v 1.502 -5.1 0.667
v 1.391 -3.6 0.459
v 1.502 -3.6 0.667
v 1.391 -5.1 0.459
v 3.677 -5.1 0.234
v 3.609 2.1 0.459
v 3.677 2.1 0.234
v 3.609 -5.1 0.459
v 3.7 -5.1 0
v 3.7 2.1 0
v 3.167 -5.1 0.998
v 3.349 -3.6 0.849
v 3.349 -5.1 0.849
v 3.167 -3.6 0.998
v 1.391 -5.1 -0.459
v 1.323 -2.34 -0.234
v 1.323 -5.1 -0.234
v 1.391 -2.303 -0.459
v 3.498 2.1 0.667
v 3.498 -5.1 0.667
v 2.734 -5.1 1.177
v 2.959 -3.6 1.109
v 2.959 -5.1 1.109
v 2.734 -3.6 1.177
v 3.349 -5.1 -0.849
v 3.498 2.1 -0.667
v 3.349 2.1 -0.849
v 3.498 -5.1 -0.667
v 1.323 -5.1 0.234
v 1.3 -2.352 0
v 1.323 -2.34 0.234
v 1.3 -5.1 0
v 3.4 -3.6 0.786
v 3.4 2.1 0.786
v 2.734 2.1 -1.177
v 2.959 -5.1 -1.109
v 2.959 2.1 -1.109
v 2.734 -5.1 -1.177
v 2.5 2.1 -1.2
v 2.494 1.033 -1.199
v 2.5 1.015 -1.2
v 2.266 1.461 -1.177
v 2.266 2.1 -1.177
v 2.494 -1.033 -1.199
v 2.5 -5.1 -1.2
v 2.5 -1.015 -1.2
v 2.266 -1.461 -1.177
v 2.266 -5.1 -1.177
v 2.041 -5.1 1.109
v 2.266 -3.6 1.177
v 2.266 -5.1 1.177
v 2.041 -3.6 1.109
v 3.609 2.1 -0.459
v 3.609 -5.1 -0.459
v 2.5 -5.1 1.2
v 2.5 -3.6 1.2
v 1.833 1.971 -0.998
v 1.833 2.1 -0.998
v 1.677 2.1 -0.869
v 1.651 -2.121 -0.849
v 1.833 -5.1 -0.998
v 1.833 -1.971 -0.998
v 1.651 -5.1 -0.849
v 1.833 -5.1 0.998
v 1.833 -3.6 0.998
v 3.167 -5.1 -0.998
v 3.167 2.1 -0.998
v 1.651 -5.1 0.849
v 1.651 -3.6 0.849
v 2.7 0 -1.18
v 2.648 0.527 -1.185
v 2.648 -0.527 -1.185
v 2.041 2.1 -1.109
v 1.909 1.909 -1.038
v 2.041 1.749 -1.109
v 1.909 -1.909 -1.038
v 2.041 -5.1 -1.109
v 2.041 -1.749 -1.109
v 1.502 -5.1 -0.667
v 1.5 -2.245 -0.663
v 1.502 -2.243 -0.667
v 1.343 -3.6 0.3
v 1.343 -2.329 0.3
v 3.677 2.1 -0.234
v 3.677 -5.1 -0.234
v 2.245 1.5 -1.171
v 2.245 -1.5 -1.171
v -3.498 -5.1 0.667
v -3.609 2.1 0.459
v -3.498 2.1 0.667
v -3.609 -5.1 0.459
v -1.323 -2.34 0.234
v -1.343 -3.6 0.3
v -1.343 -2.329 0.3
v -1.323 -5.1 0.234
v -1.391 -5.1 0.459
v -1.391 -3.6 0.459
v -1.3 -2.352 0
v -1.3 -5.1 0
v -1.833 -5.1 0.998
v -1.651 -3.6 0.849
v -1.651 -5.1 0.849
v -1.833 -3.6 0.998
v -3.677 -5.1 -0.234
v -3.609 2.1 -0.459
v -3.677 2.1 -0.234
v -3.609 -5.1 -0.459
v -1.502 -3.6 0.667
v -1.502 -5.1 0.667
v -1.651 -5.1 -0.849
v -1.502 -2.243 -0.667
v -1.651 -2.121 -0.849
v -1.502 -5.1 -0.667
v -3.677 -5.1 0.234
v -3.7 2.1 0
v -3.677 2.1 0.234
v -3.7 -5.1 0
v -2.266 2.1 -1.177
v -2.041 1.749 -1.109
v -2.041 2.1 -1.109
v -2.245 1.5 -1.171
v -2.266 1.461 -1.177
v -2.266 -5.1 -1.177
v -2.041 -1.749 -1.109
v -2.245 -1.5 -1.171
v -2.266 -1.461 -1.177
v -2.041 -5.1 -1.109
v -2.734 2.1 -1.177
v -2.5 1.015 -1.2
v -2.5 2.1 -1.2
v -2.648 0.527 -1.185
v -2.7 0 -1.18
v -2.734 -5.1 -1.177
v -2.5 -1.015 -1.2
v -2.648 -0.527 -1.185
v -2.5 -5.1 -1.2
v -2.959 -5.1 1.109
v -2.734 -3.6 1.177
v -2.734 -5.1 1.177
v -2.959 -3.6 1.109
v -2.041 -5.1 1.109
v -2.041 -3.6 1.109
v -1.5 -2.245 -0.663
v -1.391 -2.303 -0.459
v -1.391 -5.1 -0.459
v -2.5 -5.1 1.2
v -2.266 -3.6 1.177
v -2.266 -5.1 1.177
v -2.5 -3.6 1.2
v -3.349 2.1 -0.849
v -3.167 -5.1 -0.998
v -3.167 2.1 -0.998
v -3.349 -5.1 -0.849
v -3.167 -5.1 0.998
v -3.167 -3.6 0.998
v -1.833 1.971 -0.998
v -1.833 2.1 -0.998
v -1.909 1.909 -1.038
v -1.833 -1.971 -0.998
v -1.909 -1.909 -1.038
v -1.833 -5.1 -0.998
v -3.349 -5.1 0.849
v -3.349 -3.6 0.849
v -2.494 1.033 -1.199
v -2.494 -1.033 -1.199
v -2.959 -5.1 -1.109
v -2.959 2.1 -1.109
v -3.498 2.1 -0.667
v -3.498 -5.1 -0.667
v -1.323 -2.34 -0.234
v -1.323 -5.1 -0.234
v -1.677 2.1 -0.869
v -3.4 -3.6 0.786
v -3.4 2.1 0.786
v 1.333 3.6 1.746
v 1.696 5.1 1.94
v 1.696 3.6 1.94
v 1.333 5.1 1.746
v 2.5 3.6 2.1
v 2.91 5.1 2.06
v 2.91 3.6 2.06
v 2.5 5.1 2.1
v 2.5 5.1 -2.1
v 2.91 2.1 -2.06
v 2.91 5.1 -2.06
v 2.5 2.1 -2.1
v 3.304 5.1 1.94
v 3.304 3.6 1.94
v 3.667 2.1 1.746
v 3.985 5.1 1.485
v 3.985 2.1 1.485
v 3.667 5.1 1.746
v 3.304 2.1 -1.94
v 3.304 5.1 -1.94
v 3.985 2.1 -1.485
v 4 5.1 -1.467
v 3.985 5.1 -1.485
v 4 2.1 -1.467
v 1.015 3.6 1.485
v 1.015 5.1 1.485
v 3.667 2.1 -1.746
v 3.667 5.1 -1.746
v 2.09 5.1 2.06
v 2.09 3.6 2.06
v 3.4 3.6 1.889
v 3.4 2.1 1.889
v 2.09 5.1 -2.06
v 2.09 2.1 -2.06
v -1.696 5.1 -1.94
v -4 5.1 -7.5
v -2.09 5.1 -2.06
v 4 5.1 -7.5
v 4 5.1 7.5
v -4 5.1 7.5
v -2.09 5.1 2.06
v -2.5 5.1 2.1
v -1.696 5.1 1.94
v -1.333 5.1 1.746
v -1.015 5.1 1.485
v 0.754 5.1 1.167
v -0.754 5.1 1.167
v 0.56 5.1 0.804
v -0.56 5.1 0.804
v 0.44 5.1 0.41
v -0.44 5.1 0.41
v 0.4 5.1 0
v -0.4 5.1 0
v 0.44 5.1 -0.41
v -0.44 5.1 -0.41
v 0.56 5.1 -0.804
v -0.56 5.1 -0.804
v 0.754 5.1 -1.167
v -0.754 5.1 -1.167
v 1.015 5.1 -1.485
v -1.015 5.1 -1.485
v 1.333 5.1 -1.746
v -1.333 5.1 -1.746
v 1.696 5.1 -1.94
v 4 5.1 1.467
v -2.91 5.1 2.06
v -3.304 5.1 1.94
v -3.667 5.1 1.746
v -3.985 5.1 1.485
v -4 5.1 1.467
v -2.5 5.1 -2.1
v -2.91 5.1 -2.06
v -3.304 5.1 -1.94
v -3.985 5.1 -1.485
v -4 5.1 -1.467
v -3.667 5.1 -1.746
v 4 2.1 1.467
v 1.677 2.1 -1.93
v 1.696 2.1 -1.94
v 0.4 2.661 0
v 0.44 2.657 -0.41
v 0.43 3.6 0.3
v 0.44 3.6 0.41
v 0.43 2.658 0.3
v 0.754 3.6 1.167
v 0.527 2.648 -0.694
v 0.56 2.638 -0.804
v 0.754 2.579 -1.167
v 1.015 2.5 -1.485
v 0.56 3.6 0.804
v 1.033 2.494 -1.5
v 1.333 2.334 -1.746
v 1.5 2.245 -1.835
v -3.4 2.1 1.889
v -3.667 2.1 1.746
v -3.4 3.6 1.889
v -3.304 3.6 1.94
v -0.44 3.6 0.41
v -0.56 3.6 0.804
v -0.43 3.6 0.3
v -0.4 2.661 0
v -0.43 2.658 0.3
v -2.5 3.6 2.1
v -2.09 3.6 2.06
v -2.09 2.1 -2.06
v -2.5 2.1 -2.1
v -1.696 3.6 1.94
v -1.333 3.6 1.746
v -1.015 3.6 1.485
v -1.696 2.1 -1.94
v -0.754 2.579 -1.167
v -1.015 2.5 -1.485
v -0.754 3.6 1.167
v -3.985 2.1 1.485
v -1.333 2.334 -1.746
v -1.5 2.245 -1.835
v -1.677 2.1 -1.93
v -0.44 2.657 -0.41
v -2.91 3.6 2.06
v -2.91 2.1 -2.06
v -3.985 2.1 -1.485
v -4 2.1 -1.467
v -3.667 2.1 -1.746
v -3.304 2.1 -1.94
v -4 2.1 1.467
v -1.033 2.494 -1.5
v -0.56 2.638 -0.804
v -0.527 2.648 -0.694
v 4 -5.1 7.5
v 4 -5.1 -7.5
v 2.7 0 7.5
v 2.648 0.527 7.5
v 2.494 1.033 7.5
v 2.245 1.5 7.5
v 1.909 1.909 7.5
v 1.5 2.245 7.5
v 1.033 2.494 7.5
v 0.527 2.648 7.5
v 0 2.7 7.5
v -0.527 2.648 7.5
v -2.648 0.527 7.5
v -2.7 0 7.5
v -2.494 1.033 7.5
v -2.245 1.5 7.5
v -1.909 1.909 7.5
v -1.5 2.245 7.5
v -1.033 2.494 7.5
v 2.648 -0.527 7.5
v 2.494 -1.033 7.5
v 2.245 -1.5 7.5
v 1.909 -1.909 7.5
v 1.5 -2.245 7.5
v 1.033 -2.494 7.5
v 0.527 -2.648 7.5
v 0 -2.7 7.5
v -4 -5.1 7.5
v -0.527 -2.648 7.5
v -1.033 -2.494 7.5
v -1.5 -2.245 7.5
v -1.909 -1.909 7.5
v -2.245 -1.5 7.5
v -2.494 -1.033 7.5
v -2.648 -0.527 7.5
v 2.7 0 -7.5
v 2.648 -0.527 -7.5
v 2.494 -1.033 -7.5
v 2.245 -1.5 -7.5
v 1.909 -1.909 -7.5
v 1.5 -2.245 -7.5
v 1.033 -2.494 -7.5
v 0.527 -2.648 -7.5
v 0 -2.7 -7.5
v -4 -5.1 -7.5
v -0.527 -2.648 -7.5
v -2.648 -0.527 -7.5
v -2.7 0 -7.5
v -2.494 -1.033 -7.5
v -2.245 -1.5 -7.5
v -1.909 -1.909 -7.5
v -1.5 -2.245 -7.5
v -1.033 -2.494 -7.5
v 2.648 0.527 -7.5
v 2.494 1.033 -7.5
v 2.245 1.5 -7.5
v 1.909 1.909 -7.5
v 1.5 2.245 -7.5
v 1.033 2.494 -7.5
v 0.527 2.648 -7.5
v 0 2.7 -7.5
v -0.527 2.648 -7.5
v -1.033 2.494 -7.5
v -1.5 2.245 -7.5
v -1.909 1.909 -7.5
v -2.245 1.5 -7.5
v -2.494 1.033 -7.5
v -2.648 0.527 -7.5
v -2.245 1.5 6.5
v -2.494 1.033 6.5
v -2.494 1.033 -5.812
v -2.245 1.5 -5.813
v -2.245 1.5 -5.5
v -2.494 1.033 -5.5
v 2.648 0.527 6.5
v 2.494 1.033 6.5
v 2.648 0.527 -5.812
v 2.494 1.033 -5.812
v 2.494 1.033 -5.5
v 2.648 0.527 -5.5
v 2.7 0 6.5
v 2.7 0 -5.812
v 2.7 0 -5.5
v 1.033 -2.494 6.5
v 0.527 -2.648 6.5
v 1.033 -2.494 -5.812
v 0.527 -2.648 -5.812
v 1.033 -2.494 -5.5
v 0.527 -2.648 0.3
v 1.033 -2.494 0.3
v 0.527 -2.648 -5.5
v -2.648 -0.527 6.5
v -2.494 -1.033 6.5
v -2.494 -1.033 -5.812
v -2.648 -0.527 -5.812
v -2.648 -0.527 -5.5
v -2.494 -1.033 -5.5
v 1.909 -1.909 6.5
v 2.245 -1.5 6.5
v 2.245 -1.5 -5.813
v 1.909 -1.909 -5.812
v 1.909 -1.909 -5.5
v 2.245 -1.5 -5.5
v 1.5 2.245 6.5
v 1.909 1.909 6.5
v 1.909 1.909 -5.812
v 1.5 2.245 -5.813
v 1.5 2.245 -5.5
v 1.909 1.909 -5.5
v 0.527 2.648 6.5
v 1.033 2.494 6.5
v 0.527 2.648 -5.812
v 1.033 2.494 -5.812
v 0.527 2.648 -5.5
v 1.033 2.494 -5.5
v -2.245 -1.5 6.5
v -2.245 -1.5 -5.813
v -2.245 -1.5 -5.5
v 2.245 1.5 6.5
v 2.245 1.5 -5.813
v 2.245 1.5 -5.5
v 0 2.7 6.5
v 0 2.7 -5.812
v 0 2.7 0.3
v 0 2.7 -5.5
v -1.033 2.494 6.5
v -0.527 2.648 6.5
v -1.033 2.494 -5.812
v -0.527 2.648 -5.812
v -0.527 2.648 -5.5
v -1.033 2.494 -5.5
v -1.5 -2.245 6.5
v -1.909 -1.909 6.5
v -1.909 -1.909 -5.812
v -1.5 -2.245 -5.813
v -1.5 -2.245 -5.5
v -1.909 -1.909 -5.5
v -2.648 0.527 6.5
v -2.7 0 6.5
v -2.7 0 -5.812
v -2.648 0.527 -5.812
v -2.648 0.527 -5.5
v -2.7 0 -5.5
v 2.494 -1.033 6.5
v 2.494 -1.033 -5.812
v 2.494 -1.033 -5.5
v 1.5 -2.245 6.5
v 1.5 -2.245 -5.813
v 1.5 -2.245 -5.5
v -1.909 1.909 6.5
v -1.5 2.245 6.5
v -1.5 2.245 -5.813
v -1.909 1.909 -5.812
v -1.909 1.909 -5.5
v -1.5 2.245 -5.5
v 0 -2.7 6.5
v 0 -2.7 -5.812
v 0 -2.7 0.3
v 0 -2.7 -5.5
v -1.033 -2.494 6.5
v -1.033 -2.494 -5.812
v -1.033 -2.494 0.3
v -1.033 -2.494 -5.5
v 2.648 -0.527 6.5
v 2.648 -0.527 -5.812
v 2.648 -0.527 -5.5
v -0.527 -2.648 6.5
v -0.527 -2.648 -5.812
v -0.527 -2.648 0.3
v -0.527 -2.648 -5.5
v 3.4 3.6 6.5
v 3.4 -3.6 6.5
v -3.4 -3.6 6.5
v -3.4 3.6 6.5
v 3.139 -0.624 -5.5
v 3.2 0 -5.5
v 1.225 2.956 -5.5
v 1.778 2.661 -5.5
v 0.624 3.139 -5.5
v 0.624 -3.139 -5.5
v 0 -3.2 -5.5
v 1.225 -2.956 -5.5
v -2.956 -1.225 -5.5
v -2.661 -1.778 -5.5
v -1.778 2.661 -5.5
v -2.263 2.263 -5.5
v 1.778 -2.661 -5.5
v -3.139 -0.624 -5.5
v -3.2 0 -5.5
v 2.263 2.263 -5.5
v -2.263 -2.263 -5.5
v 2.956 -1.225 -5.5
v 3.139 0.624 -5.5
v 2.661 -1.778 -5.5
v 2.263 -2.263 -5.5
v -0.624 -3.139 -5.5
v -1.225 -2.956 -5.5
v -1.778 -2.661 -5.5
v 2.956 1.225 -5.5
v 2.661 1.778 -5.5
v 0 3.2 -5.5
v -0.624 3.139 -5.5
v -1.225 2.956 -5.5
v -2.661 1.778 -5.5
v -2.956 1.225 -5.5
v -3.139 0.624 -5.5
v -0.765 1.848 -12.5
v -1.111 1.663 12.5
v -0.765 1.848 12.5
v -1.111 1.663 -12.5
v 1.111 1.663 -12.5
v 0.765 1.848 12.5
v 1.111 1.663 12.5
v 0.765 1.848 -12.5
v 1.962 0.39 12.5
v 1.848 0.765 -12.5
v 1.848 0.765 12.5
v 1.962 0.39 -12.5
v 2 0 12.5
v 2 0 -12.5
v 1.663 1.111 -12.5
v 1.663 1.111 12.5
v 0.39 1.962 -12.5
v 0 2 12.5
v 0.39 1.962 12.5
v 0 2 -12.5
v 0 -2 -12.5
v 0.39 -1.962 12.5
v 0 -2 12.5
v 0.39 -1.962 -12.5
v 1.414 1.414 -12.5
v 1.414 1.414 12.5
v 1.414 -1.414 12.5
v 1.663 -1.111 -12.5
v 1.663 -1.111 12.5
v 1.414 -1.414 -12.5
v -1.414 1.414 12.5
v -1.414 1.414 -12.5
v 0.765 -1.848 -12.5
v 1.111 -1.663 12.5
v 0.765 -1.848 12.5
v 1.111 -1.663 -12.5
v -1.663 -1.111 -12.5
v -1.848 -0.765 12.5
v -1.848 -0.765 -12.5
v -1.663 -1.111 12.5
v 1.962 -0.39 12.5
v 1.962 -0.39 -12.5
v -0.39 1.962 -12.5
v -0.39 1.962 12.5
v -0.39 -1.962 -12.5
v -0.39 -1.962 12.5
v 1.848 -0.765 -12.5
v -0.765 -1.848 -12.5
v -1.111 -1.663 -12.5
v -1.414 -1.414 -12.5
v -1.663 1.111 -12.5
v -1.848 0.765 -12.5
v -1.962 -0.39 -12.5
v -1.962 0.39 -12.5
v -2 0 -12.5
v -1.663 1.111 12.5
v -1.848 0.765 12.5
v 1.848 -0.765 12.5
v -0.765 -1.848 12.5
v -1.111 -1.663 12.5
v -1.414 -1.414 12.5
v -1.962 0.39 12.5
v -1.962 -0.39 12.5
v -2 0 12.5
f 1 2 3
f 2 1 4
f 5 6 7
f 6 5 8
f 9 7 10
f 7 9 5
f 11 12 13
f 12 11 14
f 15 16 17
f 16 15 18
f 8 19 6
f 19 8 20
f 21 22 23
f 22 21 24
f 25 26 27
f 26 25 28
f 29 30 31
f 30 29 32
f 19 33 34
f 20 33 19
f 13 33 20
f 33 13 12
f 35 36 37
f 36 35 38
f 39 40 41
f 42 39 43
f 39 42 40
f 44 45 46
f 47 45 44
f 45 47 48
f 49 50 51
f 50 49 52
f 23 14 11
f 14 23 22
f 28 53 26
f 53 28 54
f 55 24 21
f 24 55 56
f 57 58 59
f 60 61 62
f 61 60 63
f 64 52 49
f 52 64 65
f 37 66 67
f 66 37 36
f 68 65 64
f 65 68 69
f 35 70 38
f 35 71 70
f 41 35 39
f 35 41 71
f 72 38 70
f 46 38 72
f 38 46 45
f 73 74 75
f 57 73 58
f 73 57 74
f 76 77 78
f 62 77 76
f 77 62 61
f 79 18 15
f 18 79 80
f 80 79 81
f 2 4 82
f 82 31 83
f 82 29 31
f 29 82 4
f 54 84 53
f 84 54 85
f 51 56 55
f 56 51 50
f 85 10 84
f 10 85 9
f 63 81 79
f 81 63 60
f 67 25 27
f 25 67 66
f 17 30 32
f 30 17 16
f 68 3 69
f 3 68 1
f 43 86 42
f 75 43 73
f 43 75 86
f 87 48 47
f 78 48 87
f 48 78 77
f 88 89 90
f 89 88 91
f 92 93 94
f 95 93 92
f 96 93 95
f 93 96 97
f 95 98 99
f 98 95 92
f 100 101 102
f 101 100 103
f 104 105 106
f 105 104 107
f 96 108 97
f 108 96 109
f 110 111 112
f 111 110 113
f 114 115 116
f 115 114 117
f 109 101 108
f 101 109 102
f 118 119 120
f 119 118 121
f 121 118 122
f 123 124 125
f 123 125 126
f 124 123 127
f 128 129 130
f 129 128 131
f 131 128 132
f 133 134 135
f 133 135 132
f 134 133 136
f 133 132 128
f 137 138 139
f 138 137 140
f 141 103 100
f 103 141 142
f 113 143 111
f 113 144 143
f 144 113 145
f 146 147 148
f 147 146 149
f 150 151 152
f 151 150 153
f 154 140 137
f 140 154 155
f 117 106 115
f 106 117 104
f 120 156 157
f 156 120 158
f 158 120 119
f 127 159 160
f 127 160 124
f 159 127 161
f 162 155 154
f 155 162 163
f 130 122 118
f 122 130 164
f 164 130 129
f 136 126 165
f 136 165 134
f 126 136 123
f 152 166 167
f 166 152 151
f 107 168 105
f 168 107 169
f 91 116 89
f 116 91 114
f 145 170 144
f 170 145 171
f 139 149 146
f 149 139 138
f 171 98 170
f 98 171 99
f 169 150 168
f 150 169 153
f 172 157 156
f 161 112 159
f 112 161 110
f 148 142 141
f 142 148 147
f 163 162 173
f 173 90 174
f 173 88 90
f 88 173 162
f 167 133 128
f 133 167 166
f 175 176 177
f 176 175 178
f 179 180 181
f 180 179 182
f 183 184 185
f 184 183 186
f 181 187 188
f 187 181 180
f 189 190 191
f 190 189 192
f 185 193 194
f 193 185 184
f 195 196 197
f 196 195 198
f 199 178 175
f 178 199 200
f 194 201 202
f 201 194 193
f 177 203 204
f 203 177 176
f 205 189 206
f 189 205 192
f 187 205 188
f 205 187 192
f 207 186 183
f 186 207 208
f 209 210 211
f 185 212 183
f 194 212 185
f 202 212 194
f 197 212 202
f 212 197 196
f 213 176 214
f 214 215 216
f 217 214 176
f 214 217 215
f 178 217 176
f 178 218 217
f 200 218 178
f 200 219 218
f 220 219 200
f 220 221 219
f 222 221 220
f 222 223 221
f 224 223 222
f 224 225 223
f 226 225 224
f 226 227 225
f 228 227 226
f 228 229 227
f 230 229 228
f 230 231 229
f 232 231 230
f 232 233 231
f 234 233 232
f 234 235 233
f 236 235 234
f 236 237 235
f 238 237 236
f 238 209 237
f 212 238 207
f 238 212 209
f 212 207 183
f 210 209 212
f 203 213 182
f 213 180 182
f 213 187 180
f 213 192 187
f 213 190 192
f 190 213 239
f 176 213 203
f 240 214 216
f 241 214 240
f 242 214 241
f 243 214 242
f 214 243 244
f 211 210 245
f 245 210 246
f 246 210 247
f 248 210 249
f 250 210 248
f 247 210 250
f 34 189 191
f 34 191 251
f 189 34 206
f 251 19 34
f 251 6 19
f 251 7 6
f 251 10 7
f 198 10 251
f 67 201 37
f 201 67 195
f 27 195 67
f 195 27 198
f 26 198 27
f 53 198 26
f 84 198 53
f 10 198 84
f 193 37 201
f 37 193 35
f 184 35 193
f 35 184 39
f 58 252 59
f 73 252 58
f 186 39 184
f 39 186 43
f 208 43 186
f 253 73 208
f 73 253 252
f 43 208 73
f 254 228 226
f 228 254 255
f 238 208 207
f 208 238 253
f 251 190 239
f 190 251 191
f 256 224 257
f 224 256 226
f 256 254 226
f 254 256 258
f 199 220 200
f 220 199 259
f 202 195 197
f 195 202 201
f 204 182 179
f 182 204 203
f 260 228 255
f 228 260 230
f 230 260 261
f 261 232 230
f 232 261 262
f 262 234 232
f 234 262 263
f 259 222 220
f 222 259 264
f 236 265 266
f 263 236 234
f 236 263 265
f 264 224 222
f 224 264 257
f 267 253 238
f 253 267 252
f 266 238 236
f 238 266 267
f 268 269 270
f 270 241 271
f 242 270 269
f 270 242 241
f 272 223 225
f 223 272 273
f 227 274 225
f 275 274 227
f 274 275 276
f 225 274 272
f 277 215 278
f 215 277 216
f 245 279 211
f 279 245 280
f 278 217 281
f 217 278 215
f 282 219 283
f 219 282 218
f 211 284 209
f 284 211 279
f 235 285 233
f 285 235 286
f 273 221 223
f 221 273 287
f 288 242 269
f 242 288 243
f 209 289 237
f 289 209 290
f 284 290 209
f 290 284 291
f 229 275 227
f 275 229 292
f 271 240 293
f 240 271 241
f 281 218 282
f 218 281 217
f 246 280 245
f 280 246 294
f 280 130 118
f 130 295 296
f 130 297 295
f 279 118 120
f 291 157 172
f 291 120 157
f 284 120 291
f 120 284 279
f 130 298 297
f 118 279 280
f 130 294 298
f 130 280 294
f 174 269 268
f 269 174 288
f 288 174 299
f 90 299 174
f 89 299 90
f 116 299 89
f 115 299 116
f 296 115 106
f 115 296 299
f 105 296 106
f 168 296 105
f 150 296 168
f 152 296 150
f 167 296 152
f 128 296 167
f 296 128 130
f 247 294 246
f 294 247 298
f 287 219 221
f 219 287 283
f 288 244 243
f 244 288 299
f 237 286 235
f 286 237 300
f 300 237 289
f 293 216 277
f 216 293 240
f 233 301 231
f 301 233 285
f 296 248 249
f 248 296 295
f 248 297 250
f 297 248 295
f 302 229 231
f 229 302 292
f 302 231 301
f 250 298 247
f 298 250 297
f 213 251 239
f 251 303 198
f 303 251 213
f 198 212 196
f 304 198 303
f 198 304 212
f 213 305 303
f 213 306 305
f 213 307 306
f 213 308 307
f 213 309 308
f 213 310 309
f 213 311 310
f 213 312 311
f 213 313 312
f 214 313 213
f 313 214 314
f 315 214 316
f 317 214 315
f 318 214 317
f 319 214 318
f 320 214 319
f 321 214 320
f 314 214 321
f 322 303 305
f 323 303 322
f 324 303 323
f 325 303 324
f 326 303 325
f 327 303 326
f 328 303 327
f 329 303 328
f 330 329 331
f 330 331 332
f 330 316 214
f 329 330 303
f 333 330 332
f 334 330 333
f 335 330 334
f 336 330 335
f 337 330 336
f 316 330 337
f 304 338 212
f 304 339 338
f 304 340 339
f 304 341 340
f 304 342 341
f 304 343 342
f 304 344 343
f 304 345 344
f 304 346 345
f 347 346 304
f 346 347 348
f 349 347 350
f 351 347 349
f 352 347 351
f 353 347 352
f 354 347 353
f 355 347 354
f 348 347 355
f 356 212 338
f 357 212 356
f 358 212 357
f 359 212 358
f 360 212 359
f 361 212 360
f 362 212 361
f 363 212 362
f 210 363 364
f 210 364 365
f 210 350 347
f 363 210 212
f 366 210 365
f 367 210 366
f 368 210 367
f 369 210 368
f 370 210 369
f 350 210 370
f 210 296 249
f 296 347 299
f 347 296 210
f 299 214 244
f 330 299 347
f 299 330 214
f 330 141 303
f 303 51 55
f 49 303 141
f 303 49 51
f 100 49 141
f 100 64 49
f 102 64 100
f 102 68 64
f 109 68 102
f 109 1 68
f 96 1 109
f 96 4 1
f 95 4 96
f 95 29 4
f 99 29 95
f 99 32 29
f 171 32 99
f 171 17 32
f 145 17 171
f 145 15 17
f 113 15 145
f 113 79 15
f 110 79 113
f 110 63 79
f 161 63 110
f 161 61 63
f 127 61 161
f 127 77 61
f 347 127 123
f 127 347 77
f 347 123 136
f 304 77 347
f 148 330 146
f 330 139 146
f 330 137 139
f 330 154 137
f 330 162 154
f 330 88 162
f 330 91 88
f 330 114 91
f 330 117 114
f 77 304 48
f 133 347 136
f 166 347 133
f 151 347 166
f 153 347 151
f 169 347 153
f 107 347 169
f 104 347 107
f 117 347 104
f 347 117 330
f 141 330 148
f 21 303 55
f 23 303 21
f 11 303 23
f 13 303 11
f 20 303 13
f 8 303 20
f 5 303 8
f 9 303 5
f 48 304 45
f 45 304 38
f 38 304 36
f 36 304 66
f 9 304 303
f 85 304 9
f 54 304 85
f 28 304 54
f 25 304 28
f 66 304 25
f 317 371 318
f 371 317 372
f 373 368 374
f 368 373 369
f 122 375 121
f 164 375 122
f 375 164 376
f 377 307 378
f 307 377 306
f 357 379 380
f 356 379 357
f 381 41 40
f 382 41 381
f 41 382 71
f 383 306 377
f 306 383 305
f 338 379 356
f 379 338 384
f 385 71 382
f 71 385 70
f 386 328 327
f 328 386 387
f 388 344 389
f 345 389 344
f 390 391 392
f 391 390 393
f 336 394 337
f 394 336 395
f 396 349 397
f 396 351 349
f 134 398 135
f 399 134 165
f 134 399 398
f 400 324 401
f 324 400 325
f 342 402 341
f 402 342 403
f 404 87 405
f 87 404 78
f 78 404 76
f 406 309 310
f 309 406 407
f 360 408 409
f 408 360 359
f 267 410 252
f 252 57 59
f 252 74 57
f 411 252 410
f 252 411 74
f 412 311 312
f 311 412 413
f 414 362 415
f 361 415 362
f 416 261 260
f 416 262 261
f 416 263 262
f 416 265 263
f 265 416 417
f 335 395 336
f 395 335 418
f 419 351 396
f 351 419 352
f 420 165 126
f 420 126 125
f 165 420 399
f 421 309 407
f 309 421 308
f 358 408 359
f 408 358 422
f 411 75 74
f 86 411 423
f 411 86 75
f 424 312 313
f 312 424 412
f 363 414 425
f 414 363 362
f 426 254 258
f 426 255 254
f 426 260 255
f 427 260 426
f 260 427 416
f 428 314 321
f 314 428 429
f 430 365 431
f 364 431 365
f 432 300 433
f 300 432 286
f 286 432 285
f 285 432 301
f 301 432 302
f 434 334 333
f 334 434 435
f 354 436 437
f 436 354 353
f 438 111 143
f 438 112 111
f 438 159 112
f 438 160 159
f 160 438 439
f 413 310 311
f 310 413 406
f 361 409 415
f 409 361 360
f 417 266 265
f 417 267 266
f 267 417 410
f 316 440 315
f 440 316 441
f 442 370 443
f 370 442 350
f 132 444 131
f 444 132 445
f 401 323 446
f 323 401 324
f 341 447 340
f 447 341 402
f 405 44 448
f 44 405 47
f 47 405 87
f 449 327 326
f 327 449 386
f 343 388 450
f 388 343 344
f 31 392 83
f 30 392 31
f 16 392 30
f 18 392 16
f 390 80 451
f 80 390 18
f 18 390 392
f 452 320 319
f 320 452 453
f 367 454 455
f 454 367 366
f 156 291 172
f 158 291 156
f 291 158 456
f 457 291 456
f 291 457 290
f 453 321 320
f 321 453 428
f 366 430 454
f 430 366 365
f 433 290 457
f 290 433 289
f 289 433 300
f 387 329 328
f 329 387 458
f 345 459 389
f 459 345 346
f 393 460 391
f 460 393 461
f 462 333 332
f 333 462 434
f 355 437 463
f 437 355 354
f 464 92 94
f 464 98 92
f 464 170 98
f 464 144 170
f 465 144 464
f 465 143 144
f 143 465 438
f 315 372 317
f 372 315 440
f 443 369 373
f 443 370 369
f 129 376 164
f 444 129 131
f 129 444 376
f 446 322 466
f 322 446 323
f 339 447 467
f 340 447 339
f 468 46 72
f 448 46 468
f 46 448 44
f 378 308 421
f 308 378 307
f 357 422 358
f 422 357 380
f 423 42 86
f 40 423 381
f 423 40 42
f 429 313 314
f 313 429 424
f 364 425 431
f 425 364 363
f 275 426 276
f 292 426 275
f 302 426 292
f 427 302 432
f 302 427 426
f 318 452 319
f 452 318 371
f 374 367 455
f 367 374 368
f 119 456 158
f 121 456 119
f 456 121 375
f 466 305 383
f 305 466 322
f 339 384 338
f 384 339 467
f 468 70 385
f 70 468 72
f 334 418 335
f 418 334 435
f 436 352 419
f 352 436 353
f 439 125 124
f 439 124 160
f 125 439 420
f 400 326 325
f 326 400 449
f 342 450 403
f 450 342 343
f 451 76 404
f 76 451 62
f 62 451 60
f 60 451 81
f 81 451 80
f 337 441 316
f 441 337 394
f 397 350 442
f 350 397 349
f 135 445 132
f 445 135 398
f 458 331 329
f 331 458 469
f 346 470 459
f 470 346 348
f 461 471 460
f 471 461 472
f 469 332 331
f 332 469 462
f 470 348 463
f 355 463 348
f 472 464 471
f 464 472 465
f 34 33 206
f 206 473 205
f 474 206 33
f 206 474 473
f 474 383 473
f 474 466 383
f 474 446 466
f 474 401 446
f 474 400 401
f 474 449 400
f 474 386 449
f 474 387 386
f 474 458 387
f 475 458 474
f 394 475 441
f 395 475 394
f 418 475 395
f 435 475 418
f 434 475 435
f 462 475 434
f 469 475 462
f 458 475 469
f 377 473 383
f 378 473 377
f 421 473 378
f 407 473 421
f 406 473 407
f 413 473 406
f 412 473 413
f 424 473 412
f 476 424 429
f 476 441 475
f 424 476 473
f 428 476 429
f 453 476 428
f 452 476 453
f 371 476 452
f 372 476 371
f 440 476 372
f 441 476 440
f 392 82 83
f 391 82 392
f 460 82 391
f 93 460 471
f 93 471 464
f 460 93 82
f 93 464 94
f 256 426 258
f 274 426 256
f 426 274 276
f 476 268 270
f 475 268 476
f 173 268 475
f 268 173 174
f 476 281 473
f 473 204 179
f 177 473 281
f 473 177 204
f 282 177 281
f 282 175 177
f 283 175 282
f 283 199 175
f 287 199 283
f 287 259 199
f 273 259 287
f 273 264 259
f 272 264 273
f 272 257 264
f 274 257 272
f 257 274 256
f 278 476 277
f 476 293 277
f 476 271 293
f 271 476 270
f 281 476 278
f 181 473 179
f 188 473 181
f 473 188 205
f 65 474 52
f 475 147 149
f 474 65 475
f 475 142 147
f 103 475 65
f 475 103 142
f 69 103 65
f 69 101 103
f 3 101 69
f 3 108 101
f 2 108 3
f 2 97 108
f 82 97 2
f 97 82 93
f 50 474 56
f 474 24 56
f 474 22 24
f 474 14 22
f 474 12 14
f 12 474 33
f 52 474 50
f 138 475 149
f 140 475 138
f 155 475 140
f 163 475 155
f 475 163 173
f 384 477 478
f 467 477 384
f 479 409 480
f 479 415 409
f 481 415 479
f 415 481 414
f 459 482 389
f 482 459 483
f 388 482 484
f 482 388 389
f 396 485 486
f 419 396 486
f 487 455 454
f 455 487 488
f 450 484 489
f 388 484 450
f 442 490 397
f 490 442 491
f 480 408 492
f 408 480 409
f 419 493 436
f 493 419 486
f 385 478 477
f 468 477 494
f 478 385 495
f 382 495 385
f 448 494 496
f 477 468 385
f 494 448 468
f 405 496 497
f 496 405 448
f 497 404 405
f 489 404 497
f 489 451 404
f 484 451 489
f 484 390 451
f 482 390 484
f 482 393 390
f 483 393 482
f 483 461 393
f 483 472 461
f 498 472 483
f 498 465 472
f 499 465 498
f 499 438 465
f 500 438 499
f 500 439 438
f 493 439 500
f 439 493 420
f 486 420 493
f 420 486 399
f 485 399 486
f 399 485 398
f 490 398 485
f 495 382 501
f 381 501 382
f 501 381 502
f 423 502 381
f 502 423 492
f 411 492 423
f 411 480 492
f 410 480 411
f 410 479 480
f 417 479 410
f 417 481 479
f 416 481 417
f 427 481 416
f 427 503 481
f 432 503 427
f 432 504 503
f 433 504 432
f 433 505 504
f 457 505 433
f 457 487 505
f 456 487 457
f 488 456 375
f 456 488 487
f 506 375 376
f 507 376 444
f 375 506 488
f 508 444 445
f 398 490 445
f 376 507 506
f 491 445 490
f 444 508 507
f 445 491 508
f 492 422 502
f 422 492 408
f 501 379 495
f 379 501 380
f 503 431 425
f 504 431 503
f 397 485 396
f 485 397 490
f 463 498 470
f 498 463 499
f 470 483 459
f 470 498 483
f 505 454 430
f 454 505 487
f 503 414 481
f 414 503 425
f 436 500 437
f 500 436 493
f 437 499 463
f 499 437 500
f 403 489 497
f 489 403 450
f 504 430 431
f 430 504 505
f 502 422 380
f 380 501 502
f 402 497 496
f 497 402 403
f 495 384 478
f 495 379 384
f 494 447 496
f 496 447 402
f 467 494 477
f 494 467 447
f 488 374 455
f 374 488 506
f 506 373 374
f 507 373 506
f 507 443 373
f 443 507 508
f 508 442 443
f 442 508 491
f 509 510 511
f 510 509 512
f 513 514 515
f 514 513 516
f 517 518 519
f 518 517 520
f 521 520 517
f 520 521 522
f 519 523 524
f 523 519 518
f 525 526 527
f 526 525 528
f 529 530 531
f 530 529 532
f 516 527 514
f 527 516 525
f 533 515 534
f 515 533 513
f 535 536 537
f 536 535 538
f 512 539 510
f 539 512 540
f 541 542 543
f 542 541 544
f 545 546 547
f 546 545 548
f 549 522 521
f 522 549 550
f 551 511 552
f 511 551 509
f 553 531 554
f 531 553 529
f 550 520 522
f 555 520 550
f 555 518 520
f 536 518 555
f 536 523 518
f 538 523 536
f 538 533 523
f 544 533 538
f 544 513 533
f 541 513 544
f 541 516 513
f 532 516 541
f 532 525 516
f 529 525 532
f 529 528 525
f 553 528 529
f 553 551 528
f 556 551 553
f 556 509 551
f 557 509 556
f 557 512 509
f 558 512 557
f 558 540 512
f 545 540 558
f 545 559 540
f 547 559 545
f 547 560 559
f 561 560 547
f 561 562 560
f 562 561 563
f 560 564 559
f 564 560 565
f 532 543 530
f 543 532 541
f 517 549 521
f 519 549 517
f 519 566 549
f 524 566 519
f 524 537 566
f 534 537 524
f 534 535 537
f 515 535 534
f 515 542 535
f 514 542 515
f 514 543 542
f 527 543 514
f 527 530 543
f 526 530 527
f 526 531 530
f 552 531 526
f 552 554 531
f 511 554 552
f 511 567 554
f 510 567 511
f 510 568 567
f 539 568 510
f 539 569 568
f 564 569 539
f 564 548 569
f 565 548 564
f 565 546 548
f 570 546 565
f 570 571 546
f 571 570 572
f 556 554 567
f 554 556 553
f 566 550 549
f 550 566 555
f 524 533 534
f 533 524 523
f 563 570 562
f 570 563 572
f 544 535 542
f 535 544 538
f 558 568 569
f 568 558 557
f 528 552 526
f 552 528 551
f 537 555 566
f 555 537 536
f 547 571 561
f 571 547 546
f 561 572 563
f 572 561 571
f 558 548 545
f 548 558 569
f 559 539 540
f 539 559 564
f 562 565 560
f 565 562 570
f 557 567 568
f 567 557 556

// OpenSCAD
// Parameters
block_width = 8.0; //[4.0:16.0:0.1]
block_depth = 10.2; //[5.1:20.4:0.1]
block_height = 15.0; //[7.5:30.0:0.1]
tolerance_clearance = 0.2; //[0.0:0.6:0.05]
nut_capture_style = 1; //[0:1:1]
bore_diameter = 5.2; //[2.6:10.4:0.1]
bore_depth = 12.0; //[6.0:15.0:0.1]
anti_rotation_flat_width = 6.6; //[3.3:8.0:0.1]
anti_rotation_flat_depth = 7.0; //[3.5:10.2:0.1]
anti_rotation_height = 6.0; //[3.0:12.0:0.1]
mount_hole_count = 2; //[0:4:1]
mount_hole_diameter = 2.2; //[1.0:4.4:0.1]
mount_hole_spacing = 5.0; //[2.5:7.0:0.1]
mount_hole_axis = 0; //[0:1:1]
counterbore_diameter = 4.2; //[2.0:8.4:0.1]
counterbore_depth = 2.0; //[0.5:5.0:0.1]
chamfer_size = 0.5; //[0.0:1.5:0.1]
leadscrew_diameter = 4.0; //[2.0:8.0:0.1]
leadscrew_length = 25.0; //[15.0:60.0:0.5]
overlap = 1.0; //[0.5:2.0:0.1]

// Leadscrew - complete geometry
module leadscrew() {
  color("Silver") {
    cylinder(d=leadscrew_diameter, h=leadscrew_length, center=true, $fn=32);
  }
}

// Main block with features
module main_block() {
  difference() {
    // Main block
    color([0.85, 0.85, 0.8]) cube([block_width, block_depth, block_height], center=true);
    
    // Nut bore or pocket
    translate([0, 0, 0])
      cylinder(d=bore_diameter + tolerance_clearance, h=block_height + 2*overlap, center=true, $fn=32);
    
    // Anti-rotation feature
    translate([0, 0, block_height/2 - (anti_rotation_height + tolerance_clearance)/2 - overlap])
      cube([anti_rotation_flat_width + tolerance_clearance, anti_rotation_flat_depth + tolerance_clearance, anti_rotation_height + tolerance_clearance], center=true);
    
    // Mounting holes
    if (mount_hole_count >= 2) {
      translate([mount_hole_spacing/2, 0, 0])
        rotate([90, 0, 0])
        cylinder(d=mount_hole_diameter + tolerance_clearance, h=block_depth + 2*overlap, center=true, $fn=32);
      
      translate([-mount_hole_spacing/2, 0, 0])
        rotate([90, 0, 0])
        cylinder(d=mount_hole_diameter + tolerance_clearance, h=block_depth + 2*overlap, center=true, $fn=32);
      
      // Counterbores
      translate([mount_hole_spacing/2, block_depth/2 - (counterbore_depth + overlap)/2, 0])
        rotate([90, 0, 0])
        cylinder(d=counterbore_diameter, h=counterbore_depth + overlap, center=true, $fn=32);
      
      translate([-mount_hole_spacing/2, block_depth/2 - (counterbore_depth + overlap)/2, 0])
        rotate([90, 0, 0])
        cylinder(d=counterbore_diameter, h=counterbore_depth + overlap, center=true, $fn=32);
    }
    
    // Lead-in chamfers
    translate([0, 0, block_height/2 - (2*chamfer_size + overlap)/2])
      cylinder(r1=(bore_diameter + tolerance_clearance)/2 + chamfer_size, r2=0, h=2*chamfer_size + overlap, center=true, $fn=32);
    
    translate([0, 0, -block_height/2 + (2*chamfer_size + overlap)/2])
      rotate([180, 0, 0])
      cylinder(r1=(bore_diameter + tolerance_clearance)/2 + chamfer_size, r2=0, h=2*chamfer_size + overlap, center=true, $fn=32);
  }
}

// Assembly
module assembly() {
  union() {
    main_block();
    leadscrew();
  }
}

assembly();
